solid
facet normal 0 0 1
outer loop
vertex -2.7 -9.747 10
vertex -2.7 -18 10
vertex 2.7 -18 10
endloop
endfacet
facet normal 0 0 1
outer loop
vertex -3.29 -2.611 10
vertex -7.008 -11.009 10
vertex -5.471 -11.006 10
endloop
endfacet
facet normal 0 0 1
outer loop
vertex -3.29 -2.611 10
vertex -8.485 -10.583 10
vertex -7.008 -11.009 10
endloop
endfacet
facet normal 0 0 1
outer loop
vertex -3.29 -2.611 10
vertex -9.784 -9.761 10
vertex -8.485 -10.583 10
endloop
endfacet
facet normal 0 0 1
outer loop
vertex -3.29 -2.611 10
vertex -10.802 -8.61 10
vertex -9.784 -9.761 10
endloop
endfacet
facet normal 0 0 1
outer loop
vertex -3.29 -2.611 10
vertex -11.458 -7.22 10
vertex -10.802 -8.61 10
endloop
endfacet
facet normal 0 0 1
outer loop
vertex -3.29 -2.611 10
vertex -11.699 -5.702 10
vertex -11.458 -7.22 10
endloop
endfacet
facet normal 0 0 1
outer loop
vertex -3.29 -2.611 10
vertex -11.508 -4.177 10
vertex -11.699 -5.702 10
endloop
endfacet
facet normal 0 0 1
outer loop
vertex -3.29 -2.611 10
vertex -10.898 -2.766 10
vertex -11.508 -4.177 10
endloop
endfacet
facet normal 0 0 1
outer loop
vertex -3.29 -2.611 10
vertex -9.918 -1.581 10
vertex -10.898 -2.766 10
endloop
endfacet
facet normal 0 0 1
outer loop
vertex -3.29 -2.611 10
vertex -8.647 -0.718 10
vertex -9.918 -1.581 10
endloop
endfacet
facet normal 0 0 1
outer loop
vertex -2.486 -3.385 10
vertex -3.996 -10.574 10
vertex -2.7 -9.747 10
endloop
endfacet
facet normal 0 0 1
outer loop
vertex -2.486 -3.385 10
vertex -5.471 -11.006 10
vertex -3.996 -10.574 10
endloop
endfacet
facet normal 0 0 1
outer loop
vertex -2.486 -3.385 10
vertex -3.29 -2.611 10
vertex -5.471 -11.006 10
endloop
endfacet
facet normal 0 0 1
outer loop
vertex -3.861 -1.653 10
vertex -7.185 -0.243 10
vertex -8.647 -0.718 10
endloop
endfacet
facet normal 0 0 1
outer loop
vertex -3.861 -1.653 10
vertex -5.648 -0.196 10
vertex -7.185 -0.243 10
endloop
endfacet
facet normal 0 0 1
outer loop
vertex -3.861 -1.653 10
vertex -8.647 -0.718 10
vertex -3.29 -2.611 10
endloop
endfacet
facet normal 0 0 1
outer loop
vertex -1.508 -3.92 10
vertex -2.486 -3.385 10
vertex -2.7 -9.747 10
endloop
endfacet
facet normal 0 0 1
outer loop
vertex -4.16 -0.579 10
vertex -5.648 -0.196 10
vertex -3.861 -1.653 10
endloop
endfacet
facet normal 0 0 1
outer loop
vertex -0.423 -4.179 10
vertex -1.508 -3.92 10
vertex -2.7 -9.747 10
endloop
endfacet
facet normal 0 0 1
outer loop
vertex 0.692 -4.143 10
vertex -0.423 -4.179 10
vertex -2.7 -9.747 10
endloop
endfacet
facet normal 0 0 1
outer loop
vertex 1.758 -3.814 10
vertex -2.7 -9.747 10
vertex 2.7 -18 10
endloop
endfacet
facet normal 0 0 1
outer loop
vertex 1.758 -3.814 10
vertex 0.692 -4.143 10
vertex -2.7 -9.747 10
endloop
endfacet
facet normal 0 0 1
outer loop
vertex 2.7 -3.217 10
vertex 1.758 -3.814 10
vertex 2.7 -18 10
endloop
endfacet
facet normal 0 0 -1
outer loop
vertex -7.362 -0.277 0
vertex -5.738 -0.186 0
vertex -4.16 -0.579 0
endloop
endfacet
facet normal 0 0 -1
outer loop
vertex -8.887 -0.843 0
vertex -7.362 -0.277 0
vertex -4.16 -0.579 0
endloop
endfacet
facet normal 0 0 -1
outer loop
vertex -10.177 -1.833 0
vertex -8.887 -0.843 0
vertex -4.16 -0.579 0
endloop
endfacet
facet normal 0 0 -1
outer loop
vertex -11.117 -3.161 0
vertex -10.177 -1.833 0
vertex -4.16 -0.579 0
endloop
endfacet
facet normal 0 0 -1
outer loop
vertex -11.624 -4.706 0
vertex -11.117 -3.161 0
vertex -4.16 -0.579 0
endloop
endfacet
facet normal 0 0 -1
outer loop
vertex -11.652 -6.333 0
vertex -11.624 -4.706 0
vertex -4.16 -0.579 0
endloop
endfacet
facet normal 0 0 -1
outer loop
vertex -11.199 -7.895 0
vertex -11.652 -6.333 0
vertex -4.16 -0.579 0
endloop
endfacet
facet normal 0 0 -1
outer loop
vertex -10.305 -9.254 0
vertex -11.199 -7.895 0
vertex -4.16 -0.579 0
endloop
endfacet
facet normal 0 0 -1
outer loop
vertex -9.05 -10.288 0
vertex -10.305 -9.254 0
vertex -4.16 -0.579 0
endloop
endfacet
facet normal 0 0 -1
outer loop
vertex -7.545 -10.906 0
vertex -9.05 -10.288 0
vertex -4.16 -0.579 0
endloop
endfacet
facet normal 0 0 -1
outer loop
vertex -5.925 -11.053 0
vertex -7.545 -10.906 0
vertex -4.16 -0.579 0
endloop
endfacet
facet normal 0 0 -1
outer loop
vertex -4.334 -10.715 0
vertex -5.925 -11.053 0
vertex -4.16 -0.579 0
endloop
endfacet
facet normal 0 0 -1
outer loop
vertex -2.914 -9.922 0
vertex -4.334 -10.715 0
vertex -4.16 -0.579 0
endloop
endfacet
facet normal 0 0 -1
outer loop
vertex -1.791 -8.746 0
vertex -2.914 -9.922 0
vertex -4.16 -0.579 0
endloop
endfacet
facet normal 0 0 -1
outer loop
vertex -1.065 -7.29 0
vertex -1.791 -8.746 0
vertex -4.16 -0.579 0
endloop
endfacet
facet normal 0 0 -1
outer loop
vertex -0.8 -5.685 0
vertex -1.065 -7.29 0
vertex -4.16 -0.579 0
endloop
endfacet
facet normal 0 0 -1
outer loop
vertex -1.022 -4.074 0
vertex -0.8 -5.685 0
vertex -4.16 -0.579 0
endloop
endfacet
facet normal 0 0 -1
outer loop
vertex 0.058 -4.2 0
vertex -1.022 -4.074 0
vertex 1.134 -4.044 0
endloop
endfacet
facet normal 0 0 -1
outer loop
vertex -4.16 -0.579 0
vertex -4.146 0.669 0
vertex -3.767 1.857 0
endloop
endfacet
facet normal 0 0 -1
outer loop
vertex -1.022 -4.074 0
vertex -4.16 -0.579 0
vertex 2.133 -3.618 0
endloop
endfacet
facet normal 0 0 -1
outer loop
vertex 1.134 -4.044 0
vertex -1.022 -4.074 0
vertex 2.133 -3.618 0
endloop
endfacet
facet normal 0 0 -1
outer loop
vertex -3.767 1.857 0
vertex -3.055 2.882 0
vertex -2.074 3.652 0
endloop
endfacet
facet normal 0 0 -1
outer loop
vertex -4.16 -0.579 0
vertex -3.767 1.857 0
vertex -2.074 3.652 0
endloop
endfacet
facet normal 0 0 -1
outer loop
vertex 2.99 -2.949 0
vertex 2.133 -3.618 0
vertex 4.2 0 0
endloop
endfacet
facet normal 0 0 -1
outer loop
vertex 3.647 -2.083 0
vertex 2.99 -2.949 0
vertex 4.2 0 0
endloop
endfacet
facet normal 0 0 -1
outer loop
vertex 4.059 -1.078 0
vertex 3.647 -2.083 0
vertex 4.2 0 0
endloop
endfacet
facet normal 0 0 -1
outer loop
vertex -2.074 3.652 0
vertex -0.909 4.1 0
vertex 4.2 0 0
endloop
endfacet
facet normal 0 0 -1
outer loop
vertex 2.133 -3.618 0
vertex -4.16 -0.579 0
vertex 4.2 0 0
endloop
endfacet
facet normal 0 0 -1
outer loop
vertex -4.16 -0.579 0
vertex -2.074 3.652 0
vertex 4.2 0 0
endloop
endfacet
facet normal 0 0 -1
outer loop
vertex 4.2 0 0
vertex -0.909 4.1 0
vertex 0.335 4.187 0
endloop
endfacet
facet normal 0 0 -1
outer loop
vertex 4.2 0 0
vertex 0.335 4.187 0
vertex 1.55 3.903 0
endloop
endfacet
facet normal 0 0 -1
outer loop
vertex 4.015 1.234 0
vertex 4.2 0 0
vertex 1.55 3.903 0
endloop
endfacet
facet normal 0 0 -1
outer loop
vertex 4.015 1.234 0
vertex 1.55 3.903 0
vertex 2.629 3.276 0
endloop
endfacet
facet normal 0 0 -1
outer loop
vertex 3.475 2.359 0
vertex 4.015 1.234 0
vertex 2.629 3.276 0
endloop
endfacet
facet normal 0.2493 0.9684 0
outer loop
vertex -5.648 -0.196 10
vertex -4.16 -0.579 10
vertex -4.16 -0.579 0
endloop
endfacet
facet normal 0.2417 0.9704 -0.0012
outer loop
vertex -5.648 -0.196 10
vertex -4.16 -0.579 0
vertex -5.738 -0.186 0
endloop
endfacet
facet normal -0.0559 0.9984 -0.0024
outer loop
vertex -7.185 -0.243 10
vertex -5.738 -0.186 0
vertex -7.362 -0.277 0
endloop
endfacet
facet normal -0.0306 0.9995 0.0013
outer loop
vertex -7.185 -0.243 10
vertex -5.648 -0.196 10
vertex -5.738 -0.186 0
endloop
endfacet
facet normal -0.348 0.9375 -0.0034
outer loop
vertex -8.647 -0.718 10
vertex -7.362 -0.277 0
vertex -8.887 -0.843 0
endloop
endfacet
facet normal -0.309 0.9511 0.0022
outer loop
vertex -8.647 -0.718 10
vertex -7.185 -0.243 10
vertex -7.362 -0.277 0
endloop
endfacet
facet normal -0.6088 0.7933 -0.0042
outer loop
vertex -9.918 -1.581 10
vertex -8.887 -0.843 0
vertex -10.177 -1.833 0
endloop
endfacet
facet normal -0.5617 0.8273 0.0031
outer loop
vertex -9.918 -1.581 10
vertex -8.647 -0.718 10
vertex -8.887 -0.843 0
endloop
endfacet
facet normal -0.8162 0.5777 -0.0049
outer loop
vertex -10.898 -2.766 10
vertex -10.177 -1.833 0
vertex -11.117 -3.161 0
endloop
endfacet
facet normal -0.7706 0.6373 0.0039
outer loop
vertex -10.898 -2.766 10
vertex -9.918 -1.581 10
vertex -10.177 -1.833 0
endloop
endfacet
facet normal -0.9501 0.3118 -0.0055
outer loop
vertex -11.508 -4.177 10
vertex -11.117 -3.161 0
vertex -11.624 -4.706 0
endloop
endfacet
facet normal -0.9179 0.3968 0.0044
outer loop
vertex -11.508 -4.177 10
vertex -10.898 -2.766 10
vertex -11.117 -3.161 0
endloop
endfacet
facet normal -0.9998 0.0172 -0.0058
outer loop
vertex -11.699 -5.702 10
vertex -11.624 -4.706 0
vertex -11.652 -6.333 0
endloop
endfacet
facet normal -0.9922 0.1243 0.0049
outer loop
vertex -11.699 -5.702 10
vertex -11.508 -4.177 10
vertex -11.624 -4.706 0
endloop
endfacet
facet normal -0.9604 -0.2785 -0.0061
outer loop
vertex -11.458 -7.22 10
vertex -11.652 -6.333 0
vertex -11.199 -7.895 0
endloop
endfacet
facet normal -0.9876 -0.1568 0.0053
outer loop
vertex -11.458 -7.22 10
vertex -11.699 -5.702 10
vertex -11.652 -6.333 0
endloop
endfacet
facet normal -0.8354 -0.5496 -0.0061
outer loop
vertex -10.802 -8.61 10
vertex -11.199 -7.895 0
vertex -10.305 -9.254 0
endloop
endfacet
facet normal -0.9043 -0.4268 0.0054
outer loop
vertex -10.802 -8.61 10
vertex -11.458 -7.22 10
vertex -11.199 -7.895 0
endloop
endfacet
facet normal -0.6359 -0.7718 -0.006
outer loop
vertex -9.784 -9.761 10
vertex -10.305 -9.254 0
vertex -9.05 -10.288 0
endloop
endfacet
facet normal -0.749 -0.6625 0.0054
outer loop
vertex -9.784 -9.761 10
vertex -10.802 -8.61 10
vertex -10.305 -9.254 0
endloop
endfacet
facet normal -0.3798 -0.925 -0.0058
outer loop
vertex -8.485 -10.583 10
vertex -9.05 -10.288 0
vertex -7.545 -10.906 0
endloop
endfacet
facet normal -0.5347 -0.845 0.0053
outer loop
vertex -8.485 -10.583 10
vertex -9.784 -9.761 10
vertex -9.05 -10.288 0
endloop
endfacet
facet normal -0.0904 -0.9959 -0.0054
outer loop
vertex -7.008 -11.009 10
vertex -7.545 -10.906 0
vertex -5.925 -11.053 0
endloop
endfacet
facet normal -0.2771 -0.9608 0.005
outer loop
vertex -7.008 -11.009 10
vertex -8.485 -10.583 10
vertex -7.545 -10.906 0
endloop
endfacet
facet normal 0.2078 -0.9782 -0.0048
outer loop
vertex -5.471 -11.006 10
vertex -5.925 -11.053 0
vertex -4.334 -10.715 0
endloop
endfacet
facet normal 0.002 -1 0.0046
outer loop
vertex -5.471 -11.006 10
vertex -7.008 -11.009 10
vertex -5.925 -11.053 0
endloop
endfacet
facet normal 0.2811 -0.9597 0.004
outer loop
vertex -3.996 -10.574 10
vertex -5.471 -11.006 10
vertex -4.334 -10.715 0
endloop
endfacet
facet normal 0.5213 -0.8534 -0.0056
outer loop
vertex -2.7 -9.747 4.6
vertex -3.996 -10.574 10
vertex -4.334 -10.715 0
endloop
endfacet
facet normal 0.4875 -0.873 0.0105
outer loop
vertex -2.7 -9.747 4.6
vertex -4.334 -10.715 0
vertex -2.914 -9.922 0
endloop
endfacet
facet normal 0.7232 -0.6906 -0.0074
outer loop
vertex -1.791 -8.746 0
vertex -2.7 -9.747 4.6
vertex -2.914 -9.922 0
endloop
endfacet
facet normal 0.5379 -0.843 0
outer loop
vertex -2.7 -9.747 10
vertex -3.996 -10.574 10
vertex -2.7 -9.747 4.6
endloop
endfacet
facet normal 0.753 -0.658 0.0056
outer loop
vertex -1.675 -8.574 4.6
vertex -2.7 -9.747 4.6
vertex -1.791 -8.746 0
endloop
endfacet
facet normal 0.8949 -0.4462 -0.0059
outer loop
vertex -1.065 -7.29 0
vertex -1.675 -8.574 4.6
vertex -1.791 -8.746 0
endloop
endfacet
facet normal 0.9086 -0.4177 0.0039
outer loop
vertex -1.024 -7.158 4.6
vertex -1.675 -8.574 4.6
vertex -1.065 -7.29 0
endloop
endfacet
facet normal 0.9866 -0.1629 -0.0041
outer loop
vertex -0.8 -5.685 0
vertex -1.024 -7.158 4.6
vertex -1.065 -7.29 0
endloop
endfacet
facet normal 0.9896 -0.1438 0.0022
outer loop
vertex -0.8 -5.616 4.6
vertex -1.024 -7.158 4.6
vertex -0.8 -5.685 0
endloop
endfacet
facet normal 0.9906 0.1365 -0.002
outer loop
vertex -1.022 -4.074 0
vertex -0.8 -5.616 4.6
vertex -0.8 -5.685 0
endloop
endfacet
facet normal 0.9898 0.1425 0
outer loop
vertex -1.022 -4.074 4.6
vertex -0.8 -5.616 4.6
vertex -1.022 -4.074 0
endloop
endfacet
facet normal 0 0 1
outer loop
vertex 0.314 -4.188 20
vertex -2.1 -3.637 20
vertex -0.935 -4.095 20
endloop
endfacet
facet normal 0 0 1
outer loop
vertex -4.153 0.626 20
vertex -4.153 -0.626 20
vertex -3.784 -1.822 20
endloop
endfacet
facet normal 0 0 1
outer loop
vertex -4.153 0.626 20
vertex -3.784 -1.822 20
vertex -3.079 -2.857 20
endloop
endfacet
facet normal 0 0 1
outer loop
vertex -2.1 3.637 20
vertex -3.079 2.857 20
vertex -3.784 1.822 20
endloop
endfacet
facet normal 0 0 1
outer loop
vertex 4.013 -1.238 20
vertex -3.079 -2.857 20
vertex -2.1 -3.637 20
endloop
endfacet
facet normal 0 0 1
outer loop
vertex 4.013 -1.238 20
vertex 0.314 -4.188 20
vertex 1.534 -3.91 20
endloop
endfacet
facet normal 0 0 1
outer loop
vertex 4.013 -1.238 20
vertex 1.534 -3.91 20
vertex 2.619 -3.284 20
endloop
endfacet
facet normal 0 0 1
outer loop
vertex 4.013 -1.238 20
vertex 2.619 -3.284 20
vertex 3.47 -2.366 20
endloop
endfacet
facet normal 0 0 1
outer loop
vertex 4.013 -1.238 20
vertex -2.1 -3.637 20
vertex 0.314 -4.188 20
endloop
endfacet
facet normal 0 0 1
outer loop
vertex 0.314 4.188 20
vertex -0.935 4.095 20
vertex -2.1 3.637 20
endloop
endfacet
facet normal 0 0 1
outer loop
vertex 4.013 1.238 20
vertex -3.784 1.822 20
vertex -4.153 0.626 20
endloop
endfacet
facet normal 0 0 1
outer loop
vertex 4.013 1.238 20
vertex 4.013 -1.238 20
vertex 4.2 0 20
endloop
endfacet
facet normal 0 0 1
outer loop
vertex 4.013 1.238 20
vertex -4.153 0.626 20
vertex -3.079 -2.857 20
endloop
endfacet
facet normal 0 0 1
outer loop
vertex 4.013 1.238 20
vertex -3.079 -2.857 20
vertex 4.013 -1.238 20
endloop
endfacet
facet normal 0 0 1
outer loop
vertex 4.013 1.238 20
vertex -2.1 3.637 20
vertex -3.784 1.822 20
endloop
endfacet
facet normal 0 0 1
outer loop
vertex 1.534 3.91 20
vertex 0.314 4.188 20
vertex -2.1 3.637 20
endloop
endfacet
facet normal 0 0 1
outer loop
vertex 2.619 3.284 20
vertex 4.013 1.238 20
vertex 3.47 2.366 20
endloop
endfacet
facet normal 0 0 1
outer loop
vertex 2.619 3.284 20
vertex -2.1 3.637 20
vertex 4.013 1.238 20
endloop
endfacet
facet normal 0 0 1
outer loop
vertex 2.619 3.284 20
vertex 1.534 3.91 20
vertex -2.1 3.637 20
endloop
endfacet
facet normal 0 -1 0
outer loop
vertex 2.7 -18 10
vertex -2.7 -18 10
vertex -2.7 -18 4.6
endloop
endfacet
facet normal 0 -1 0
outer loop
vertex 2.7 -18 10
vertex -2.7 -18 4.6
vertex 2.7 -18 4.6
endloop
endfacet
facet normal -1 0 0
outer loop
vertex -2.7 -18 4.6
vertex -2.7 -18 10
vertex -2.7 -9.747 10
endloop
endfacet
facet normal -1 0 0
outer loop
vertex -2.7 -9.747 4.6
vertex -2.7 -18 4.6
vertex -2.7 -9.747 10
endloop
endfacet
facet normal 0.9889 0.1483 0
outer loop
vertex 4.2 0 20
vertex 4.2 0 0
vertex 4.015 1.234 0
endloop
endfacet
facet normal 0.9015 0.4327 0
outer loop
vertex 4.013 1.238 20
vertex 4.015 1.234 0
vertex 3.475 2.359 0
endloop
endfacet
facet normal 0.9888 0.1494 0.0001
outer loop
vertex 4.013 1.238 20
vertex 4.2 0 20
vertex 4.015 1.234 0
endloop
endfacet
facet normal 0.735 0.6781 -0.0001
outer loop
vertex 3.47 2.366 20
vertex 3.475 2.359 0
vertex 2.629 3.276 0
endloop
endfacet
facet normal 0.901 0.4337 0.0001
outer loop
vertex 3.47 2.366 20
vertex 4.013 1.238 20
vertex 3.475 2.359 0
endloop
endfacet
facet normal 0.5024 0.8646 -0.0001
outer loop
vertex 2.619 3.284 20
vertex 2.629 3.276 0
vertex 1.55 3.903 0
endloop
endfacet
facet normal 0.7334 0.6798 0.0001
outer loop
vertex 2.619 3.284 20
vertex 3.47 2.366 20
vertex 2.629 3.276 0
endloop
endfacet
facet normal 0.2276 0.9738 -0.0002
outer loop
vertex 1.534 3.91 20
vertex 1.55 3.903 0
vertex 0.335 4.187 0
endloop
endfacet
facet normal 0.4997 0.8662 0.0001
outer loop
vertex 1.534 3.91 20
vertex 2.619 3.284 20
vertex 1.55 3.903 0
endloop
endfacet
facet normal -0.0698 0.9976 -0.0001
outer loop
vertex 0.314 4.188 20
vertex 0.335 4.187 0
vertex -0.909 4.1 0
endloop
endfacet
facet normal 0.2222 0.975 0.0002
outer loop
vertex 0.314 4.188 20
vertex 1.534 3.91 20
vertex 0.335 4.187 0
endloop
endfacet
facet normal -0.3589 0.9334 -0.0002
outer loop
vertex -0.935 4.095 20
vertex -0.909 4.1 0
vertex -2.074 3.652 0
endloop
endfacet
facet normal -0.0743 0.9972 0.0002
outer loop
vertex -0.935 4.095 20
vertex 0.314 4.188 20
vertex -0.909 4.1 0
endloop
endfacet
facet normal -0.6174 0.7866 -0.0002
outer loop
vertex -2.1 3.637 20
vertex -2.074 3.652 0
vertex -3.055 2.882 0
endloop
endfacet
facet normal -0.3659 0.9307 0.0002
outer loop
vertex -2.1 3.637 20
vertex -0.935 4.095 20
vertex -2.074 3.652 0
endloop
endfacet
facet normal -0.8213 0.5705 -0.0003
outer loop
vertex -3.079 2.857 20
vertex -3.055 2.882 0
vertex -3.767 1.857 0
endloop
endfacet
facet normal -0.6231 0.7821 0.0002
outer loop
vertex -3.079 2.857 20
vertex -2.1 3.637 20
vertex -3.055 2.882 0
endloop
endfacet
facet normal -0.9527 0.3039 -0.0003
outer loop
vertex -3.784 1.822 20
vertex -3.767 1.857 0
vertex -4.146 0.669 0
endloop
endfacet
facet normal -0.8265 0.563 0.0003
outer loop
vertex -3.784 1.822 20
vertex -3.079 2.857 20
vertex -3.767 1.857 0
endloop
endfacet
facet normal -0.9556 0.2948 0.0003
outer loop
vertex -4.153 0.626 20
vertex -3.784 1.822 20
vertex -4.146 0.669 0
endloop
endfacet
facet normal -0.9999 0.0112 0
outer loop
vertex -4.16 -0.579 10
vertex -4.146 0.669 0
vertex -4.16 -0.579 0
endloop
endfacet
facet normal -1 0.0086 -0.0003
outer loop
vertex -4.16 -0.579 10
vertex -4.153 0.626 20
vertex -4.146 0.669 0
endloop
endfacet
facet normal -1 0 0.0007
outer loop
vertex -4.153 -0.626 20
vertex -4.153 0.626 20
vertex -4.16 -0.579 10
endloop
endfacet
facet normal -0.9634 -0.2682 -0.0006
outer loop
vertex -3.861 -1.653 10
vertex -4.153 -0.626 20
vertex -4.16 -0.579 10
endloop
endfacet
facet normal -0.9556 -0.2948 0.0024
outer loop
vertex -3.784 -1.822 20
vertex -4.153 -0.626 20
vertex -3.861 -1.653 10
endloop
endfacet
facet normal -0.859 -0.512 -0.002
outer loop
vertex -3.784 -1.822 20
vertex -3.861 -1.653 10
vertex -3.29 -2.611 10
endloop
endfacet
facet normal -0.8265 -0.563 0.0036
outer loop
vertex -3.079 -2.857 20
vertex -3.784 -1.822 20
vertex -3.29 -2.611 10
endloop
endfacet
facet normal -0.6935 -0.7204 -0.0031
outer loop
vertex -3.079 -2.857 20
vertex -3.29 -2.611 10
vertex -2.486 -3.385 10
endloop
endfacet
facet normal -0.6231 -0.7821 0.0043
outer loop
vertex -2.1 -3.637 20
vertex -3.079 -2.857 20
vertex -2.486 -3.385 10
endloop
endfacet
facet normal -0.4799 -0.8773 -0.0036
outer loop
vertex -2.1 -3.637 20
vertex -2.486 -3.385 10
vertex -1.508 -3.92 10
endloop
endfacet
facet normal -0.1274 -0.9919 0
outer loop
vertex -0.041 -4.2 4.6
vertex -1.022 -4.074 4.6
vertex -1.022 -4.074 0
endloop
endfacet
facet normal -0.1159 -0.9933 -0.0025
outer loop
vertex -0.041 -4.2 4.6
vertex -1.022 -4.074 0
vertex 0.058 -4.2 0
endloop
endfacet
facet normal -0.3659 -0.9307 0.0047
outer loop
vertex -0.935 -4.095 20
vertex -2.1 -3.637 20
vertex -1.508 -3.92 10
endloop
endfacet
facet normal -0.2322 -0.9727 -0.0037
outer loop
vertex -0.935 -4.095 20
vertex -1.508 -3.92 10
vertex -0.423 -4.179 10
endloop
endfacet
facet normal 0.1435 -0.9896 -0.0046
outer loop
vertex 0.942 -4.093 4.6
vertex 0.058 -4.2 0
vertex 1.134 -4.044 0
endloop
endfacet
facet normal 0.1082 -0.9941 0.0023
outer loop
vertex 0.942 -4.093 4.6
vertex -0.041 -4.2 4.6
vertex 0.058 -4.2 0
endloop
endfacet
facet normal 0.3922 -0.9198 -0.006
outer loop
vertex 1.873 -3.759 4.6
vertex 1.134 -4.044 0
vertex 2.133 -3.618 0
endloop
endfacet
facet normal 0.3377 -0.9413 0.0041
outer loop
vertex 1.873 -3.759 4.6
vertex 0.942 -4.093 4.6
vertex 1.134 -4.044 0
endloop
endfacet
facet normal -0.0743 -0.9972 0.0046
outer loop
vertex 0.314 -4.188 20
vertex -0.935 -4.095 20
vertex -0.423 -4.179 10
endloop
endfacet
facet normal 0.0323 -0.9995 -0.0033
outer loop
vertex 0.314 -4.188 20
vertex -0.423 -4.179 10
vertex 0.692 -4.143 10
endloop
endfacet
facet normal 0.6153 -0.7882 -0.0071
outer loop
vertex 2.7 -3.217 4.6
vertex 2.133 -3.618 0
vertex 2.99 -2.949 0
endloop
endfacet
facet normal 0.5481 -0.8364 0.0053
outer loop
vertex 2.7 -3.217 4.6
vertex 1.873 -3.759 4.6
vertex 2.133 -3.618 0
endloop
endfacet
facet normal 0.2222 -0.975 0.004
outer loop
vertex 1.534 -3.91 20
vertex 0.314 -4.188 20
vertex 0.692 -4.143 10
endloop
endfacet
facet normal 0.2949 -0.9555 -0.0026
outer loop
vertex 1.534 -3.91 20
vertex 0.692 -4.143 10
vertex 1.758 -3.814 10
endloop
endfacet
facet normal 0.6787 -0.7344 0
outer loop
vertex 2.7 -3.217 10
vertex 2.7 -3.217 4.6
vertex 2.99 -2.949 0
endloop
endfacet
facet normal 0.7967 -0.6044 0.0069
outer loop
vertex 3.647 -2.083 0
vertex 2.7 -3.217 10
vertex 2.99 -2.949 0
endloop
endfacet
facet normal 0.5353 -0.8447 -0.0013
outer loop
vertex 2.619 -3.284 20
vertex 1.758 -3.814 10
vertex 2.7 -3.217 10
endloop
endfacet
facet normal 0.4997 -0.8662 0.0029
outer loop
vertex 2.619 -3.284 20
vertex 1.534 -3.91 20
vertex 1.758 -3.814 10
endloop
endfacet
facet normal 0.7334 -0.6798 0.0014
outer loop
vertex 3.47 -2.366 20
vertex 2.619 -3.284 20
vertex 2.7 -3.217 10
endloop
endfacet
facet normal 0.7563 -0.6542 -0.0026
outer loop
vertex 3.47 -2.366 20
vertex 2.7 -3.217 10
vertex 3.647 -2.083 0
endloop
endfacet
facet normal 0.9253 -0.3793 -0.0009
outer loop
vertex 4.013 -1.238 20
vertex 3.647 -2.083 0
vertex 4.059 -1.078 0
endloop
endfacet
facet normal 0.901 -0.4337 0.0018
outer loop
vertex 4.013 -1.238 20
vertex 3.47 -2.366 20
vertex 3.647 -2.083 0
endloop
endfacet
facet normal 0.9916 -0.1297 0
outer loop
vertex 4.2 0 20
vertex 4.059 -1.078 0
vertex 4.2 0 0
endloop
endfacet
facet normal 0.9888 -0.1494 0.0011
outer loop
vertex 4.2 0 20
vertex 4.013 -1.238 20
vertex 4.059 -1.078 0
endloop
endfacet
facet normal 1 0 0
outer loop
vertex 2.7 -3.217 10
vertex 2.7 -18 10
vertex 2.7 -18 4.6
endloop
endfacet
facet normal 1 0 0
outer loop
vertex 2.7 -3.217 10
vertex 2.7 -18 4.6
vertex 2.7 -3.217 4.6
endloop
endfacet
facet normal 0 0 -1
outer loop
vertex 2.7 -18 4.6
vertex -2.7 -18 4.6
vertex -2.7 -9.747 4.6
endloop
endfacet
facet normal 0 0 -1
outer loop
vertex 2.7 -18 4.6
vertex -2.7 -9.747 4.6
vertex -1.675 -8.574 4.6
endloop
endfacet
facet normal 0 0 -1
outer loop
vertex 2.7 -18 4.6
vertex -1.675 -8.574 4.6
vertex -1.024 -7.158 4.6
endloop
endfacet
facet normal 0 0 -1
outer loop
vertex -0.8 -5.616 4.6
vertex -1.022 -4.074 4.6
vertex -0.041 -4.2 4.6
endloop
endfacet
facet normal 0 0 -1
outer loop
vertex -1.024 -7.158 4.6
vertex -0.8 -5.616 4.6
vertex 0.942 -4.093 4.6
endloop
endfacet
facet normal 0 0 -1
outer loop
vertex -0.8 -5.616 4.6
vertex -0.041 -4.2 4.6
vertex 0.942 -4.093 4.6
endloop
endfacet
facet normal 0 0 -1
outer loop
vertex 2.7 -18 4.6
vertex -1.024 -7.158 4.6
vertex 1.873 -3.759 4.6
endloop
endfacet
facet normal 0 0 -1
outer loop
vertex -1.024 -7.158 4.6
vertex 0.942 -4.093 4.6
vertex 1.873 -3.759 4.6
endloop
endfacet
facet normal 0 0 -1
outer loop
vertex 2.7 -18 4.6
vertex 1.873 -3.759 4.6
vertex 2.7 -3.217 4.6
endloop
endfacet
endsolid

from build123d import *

# Parameters (mm, degrees)
F1_R     = 4.2
F2_R     = 5.45
F7_W     = 5.4
F7_H     = 19.2
F8_DEPTH = 5.4


with BuildPart() as f5:
    # F5: sweep along a path in F4
    with BuildLine(Plane(origin=(0, 0, 0), x_dir=(0.744048, 0.668127, 0), z_dir=(0.668127, -0.744048, 0))) as f5_path:
        Line((0, 0), (0, 20))
    # F1 (on Top) → F5 (sweep)
    with BuildSketch(Plane.XY):
        Circle(F1_R)
    sweep(path=f5_path.line)

    # F6: sweep along a path in F4
    with BuildLine(Plane(origin=(0, 0, 0), x_dir=(0.744048, 0.668127, 0), z_dir=(0.668127, -0.744048, 0))) as f6_path:
        Line((-8.4, 0), (-8.4, 10))
    # F2 (on Top) → F6 (sweep)
    with BuildSketch(Plane.XY):
        with Locations((-6.25, -5.612263)):
            Circle(F2_R)
    sweep(path=f6_path.line)

    # F7 (on face) → F8 (join)
    with BuildSketch(Plane.XY.offset(10)):
        with Locations((0, -8.4)):
            Rectangle(F7_W, F7_H)
    extrude(amount=-F8_DEPTH)


solid = f5.part
